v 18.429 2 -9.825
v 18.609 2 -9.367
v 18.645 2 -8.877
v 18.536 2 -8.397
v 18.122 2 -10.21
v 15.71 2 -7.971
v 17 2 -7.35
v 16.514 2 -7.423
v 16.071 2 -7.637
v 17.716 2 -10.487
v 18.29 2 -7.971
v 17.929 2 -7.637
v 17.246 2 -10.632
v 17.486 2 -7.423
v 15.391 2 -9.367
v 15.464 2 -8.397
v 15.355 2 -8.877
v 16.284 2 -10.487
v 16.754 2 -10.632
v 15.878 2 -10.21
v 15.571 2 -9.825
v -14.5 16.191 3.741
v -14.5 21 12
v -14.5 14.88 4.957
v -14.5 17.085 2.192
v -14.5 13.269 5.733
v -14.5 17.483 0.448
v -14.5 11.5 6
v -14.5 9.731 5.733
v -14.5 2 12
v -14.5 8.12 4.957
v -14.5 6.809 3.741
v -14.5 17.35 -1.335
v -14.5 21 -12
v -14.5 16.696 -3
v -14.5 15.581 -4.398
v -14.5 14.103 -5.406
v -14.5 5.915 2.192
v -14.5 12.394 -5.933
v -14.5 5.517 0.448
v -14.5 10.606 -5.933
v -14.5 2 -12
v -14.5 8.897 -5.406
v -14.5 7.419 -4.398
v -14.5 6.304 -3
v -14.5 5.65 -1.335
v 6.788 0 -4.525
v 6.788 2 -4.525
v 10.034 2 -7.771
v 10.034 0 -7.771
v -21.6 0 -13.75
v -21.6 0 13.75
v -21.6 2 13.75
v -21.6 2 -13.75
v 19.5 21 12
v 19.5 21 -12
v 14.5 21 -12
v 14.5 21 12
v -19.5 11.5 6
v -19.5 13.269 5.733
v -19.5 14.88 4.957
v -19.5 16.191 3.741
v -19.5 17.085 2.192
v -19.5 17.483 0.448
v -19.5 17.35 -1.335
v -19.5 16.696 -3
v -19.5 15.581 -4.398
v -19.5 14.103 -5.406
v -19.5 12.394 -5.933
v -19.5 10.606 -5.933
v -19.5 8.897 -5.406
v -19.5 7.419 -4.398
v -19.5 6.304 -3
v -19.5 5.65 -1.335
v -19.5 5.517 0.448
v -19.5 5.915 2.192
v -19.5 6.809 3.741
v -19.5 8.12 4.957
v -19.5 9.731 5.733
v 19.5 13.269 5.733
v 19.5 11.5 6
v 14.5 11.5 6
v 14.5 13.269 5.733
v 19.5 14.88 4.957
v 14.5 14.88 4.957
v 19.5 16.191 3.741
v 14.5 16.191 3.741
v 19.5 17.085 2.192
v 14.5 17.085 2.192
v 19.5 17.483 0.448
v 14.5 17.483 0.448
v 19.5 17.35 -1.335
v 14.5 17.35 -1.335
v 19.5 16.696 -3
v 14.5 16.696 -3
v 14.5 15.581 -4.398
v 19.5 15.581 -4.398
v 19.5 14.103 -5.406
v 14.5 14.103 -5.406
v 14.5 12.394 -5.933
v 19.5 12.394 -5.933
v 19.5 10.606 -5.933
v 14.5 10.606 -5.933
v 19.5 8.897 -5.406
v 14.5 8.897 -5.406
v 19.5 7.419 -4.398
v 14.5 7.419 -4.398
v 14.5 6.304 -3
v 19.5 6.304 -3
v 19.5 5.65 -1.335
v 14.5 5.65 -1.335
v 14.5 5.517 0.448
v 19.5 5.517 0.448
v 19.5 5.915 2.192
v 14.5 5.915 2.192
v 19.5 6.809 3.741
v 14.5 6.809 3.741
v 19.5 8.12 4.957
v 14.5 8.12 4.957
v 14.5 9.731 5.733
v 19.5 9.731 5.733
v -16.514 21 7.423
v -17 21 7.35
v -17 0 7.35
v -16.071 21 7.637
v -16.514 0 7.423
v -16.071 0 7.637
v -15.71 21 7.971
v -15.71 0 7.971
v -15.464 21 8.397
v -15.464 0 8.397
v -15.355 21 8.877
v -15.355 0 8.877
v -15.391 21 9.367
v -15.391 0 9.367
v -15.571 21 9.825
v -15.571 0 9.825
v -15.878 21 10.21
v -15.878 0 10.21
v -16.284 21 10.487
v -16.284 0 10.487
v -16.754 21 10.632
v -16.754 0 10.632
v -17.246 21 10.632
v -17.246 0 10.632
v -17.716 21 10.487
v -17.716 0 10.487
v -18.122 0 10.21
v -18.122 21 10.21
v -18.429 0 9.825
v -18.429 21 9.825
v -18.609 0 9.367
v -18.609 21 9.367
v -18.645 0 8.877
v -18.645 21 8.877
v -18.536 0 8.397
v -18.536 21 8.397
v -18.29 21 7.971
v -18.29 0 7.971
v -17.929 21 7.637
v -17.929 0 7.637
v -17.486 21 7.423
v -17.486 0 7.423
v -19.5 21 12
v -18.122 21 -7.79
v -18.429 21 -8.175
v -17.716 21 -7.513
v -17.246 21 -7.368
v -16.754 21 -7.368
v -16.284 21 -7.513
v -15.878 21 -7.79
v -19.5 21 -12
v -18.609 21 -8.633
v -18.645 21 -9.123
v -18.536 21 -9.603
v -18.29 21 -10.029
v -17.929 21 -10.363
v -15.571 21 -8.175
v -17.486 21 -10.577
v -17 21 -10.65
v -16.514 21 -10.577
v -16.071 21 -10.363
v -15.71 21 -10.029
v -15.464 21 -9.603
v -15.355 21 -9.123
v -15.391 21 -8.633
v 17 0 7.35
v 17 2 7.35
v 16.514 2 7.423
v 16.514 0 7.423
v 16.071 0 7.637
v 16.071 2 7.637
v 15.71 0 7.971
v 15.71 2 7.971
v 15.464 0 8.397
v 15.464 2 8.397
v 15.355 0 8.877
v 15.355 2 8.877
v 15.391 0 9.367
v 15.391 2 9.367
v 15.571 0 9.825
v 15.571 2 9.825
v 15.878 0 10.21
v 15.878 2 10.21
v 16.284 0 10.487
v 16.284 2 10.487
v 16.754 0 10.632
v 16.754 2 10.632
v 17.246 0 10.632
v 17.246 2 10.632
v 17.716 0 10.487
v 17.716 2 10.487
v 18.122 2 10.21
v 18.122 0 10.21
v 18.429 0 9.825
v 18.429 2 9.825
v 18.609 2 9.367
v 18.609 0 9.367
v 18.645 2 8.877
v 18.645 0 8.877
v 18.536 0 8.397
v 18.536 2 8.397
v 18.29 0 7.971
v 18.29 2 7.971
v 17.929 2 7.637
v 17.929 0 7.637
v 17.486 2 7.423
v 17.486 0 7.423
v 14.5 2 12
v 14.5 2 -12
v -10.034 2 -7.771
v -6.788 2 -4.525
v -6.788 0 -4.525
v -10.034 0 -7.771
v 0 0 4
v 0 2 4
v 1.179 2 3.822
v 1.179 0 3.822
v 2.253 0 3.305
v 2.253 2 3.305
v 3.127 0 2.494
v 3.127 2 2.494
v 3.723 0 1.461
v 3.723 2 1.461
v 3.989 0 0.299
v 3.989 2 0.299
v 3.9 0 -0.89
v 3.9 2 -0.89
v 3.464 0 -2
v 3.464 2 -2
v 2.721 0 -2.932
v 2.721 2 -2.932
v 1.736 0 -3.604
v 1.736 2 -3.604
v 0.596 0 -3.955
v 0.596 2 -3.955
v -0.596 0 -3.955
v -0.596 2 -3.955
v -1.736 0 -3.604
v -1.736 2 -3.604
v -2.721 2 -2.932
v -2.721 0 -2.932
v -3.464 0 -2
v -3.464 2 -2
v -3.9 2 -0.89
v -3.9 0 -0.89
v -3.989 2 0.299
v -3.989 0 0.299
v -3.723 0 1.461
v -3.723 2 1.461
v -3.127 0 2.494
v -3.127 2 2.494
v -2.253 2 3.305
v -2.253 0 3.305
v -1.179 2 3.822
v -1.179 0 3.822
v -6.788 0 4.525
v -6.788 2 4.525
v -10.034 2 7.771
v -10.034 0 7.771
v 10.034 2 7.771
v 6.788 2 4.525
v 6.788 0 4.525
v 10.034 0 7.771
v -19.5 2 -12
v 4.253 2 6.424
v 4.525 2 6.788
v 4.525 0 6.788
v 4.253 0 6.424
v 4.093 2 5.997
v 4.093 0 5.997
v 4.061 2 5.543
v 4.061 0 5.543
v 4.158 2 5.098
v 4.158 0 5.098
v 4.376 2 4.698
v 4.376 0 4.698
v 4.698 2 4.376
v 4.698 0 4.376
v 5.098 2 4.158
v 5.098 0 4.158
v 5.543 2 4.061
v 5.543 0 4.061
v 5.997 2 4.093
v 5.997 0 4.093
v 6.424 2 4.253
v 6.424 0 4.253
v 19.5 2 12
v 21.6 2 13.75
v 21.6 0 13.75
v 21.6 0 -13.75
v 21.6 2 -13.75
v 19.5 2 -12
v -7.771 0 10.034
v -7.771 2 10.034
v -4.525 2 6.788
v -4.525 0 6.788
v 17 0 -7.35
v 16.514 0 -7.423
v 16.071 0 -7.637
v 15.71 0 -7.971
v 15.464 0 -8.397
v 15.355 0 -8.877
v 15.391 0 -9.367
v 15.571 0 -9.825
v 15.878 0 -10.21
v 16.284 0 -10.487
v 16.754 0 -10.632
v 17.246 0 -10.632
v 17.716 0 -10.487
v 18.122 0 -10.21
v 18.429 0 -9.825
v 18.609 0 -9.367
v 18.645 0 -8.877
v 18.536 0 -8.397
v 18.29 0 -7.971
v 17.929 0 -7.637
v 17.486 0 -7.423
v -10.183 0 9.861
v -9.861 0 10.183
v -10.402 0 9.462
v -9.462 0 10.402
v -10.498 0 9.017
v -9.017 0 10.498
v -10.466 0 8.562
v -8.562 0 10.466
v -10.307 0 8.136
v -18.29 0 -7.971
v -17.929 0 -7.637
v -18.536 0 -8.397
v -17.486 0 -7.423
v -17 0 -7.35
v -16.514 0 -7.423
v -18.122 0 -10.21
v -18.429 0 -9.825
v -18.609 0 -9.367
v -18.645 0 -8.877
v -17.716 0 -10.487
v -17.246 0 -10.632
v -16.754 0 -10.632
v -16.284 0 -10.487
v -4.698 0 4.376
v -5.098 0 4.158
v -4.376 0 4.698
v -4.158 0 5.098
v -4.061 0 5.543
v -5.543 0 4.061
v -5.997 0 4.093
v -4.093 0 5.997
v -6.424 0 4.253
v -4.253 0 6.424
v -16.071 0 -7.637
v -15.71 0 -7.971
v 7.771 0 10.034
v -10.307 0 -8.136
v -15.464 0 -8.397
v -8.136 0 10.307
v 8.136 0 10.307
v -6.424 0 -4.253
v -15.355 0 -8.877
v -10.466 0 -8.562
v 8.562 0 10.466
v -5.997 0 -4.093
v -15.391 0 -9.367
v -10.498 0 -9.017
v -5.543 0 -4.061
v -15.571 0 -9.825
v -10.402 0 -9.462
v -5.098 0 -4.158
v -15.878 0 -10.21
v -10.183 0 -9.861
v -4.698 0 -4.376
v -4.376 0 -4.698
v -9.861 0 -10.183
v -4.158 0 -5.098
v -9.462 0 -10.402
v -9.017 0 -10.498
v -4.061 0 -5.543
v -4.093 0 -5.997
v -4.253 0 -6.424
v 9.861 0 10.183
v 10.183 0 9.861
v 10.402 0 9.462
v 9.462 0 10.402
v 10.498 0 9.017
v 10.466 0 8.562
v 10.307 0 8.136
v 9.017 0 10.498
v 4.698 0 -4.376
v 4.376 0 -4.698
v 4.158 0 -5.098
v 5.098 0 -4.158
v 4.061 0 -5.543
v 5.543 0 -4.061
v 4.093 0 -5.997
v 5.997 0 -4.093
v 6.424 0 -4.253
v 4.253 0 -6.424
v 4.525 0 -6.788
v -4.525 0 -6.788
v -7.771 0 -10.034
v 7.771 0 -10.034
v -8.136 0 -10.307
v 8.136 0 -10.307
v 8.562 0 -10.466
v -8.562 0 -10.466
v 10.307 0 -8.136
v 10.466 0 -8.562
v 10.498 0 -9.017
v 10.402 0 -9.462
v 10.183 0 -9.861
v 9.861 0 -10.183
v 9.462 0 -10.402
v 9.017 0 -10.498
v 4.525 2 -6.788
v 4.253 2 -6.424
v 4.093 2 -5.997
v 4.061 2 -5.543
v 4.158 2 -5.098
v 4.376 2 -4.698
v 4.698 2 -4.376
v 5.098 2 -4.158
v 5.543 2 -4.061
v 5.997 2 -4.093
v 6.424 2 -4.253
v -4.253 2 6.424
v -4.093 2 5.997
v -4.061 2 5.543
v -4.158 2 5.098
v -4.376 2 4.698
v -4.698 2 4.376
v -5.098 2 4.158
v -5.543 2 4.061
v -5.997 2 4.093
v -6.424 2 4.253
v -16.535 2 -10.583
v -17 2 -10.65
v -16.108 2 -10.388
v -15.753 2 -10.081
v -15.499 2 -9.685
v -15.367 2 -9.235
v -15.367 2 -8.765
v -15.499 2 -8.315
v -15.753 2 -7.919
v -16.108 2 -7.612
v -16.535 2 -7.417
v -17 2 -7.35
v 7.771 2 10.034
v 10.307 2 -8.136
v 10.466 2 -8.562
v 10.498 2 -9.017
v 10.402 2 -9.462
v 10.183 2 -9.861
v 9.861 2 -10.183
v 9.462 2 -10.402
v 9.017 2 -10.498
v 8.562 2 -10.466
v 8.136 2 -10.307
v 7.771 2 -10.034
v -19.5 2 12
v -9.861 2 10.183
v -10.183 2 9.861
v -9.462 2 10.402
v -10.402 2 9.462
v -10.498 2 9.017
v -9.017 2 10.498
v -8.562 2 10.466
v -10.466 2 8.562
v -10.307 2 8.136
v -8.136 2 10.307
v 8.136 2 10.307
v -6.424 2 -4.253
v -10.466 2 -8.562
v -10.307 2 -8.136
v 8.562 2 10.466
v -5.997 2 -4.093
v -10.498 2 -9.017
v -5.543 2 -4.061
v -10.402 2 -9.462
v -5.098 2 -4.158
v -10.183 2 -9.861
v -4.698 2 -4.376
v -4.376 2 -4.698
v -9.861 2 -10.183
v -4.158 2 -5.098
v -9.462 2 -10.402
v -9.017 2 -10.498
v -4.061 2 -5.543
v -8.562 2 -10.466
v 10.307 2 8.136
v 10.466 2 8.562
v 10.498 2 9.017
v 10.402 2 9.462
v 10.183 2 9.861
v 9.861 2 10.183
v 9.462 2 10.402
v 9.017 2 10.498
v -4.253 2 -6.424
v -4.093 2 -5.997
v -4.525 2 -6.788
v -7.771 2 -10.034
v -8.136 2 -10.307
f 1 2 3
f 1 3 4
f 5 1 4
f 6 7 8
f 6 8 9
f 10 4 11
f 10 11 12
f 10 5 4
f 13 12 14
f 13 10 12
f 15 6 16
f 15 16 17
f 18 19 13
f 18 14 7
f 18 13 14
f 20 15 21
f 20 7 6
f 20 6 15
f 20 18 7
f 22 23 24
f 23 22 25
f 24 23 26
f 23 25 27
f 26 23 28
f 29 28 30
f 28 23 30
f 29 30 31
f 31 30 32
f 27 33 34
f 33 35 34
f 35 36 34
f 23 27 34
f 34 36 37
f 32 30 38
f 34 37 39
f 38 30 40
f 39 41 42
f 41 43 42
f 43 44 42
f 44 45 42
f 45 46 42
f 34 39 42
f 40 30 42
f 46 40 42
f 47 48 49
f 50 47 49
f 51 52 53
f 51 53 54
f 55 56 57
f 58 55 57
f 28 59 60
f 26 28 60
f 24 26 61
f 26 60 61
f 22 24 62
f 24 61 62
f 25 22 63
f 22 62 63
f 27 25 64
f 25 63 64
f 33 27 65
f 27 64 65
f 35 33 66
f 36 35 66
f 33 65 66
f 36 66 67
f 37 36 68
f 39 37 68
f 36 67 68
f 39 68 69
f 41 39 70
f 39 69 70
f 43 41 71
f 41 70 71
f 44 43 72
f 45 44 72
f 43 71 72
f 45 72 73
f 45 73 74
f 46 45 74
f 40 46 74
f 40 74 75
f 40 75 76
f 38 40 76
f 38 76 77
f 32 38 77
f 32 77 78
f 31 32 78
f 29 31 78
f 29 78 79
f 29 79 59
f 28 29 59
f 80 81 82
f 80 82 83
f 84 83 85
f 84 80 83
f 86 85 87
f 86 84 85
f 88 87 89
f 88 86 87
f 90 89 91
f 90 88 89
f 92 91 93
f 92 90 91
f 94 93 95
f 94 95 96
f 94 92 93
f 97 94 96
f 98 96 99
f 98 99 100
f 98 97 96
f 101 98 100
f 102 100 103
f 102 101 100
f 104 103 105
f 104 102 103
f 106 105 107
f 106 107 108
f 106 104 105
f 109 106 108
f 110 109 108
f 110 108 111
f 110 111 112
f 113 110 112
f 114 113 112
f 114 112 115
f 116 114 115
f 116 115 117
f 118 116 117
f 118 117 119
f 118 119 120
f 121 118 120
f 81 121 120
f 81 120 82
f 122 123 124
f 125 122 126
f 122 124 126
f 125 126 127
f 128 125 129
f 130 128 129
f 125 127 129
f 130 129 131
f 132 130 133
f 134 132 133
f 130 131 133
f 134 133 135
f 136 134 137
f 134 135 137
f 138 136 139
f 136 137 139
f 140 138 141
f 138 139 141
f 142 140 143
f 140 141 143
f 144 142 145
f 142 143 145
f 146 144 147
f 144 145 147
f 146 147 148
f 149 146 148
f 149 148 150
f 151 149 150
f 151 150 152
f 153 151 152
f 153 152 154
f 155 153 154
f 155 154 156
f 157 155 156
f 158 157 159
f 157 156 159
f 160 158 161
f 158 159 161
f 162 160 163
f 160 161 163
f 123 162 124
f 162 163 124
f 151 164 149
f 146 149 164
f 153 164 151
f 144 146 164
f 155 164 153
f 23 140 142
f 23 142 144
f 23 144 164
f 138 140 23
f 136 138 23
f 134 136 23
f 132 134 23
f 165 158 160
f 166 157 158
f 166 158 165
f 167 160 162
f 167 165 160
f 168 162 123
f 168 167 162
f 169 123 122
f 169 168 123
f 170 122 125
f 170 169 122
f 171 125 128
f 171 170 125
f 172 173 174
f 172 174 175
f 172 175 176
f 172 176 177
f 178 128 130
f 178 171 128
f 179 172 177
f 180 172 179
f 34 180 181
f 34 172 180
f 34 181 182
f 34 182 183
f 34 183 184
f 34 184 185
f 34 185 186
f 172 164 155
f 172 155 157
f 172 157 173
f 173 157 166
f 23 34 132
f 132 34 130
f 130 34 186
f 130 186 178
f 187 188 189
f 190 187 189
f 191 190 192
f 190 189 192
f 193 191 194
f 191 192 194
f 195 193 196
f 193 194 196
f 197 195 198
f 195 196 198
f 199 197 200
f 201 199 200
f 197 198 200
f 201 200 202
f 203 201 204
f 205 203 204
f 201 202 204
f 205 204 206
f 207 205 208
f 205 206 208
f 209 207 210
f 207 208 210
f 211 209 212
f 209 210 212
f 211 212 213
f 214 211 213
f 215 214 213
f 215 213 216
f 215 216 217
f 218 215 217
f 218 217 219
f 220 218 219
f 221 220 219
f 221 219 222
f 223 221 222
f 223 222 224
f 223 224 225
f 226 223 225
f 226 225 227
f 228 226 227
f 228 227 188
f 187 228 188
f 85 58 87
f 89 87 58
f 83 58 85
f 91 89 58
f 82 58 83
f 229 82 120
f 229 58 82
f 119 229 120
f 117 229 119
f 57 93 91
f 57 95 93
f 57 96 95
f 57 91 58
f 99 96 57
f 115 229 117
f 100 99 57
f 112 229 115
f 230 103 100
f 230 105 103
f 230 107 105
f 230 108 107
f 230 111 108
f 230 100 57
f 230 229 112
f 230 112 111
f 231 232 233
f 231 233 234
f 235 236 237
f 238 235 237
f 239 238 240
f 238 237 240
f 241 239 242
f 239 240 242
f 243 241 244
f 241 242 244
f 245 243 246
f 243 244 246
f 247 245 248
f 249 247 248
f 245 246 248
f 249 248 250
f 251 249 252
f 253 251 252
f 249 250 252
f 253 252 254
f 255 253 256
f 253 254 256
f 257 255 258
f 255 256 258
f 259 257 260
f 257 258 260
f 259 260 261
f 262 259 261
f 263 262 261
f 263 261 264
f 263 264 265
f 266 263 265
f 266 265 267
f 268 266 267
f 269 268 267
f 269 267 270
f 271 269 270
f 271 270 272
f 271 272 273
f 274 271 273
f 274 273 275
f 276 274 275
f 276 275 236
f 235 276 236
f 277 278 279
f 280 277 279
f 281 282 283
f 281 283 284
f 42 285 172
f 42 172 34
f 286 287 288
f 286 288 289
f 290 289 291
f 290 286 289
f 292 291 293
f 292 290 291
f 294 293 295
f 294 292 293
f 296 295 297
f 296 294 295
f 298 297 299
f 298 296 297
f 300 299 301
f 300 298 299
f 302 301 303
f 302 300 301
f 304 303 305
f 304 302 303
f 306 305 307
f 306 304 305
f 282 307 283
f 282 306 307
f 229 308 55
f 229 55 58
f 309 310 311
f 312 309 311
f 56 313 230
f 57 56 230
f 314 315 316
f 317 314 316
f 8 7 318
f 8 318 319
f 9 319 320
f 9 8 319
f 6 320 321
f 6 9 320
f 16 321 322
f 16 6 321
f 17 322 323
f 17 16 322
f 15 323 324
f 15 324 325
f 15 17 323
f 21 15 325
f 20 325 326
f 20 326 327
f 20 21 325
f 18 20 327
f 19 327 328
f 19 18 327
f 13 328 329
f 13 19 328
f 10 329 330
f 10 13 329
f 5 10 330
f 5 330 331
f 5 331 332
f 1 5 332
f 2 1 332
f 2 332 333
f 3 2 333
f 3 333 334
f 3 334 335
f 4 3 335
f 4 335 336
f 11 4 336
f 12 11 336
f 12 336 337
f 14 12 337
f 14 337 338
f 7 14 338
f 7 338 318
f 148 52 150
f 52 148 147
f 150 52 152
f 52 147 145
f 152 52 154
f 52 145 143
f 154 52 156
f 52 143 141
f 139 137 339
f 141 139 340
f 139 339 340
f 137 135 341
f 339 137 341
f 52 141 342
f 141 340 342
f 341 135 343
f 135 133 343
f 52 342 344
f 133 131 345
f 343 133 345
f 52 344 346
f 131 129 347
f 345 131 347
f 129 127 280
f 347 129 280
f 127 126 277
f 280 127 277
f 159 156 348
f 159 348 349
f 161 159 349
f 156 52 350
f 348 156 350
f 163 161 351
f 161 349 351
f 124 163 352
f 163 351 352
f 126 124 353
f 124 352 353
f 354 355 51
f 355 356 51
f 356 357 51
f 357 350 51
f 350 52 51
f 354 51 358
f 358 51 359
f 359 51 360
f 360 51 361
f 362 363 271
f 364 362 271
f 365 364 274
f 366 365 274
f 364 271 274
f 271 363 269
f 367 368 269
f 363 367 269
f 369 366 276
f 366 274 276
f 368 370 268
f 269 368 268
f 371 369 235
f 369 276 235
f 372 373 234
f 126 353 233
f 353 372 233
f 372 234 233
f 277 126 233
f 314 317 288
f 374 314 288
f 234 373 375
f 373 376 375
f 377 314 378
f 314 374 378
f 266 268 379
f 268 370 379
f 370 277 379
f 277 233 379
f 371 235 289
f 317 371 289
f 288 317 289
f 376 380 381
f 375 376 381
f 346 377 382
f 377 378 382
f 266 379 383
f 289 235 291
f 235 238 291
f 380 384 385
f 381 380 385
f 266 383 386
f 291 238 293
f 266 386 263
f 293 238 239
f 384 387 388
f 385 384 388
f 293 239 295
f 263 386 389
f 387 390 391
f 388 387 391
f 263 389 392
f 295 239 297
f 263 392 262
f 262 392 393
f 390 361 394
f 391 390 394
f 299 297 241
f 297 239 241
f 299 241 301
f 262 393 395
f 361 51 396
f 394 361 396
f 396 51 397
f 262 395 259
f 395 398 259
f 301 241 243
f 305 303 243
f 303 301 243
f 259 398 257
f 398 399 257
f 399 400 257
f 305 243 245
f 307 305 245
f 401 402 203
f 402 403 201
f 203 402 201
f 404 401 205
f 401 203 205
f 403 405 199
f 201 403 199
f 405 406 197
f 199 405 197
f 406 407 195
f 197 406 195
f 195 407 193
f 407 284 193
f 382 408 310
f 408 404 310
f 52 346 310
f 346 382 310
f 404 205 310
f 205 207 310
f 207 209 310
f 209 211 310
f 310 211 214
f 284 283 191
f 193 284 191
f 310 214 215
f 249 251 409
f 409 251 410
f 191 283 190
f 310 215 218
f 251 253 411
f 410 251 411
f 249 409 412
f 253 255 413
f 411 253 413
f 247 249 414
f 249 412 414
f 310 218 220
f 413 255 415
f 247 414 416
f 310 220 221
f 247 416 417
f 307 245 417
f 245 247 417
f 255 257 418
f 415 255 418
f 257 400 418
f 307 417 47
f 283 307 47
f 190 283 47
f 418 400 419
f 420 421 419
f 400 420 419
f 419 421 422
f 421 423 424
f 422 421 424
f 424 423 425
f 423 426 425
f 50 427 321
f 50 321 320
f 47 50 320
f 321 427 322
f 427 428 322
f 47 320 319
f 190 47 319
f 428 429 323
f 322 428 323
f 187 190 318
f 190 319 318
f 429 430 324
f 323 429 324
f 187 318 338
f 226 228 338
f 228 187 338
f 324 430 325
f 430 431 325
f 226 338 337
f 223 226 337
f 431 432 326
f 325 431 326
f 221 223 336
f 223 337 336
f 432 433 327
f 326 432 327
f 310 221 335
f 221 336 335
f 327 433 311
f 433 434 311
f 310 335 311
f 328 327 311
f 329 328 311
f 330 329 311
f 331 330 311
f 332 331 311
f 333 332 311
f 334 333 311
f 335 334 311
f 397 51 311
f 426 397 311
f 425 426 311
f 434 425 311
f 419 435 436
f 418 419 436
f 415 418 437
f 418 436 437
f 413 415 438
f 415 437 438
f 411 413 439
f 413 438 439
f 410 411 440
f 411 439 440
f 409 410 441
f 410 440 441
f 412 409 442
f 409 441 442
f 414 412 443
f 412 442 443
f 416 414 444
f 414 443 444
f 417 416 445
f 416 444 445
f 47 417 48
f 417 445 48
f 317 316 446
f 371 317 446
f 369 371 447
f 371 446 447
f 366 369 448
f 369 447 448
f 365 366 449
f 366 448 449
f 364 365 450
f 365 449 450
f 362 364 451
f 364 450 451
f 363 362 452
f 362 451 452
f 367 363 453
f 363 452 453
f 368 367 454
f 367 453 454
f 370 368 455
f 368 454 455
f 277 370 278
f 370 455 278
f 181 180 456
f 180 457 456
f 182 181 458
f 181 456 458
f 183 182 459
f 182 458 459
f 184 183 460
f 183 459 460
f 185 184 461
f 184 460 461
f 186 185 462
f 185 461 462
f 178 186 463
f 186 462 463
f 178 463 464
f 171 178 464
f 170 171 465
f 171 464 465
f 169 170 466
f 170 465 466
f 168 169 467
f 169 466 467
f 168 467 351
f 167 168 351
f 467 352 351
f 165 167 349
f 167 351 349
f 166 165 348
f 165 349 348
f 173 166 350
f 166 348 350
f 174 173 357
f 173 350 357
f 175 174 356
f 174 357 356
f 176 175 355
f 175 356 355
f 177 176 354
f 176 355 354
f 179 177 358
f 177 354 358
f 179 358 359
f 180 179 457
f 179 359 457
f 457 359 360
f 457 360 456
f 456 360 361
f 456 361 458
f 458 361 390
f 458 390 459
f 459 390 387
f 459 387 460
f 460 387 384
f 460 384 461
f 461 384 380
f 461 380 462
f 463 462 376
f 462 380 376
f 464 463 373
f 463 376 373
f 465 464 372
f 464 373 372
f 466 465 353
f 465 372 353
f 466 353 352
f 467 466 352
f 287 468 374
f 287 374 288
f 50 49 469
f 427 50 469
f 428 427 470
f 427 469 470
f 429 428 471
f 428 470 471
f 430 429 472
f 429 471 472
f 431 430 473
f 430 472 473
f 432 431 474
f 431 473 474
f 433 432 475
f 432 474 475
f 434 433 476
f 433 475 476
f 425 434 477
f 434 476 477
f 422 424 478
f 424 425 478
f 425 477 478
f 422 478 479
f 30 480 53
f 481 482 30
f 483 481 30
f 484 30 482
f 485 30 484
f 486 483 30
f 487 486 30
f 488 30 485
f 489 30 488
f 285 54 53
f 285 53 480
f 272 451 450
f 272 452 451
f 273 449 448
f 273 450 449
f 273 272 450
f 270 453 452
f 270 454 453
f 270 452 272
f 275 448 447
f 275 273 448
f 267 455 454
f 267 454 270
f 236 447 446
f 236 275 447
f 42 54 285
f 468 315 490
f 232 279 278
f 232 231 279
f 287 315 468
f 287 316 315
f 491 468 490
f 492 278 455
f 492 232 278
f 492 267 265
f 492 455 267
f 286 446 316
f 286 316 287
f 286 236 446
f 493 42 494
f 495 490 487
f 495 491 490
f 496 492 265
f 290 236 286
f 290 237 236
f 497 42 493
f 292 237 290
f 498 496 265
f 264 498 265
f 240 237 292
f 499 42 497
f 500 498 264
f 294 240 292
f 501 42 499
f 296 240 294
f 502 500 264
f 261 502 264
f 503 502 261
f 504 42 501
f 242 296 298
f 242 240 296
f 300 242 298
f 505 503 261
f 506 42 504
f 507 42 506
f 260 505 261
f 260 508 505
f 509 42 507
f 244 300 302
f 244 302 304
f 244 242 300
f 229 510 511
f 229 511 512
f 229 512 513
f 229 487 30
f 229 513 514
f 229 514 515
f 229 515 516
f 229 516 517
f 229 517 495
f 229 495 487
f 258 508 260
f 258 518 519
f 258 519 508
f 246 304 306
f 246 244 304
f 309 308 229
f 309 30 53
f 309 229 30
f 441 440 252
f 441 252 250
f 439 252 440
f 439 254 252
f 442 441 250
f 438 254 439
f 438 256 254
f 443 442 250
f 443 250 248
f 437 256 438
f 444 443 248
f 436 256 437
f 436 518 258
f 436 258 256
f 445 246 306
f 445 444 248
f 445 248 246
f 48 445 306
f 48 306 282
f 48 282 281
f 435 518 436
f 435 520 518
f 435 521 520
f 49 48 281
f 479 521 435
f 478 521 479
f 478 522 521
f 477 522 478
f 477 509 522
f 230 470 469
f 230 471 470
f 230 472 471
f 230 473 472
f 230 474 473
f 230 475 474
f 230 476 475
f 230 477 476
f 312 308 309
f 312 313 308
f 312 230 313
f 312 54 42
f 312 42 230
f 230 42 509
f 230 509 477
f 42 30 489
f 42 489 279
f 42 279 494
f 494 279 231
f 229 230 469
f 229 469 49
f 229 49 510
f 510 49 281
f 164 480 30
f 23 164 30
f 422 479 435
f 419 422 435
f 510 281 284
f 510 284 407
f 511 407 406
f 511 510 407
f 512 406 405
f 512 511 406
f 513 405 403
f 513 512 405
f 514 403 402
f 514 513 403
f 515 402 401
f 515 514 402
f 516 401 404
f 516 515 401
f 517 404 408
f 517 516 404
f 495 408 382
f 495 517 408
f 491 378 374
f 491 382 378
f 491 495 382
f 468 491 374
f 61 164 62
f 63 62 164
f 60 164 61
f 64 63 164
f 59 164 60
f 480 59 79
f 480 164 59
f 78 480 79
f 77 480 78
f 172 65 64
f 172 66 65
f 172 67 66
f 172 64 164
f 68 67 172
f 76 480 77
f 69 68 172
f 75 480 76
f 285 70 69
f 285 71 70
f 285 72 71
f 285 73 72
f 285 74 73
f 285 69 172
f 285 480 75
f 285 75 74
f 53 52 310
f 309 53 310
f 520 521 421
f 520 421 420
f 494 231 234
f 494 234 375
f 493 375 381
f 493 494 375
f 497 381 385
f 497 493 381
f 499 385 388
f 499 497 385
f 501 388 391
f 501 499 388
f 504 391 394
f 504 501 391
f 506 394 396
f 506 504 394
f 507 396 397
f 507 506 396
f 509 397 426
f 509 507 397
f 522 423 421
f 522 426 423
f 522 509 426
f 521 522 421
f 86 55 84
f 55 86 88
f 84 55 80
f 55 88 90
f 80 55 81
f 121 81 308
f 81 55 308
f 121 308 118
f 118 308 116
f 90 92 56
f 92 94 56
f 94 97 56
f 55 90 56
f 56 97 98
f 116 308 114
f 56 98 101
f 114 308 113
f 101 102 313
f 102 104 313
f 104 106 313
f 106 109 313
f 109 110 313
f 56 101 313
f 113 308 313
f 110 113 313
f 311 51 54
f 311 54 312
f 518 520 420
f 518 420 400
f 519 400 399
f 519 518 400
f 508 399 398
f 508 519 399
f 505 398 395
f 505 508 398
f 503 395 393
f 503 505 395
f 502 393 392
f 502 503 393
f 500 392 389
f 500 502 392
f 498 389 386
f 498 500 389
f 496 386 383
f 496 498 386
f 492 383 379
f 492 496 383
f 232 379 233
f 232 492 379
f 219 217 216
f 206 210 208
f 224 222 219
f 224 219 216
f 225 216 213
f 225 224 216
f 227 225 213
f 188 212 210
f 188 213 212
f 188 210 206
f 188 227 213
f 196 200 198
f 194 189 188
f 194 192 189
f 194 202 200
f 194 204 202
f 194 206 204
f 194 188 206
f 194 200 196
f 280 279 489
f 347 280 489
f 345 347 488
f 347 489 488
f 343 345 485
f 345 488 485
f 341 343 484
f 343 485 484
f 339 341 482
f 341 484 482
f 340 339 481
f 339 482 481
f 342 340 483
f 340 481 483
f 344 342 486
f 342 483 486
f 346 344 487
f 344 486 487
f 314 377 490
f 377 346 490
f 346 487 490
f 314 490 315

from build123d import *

# Parameters (mm, degrees)
SKETCH_1_W               = 43.2
SKETCH_1_H               = 27.5
EXTRUDE_1_DEPTH          = 2
CUT_EXTRUDE_1_REACH      = 27.683
SKETCH_2_R               = 1.65
CUT_EXTRUDE_2_REACH      = 27.683
MIRROR_2_COPY_1_REACH    = 27.683
MIRROR_2_COPY_1_SKETCH_R = 1.65
MIRROR_2_COPY_2_REACH    = 27.683
CUT_EXTRUDE_3_REACH      = 27.683
SKETCH_4_R               = 4
SKETCH_5_W               = 5
SKETCH_5_H               = 24
EXTRUDE_2_DEPTH          = 19
CUT_EXTRUDE_5_REACH      = 50.159
SKETCH_6_R               = 6
CUT_EXTRUDE_6_REACH      = 35.115
SKETCH_7_R               = 1.65


with BuildPart() as part:
    # 草图1 → 凸台-拉伸1 (new body)
    with BuildSketch(Plane(origin=(0, 0, 0), x_dir=(1, 0, 0), z_dir=(0, 1, 0))):
        Rectangle(SKETCH_1_W, SKETCH_1_H)
    extrude(amount=EXTRUDE_1_DEPTH)

    # 草图2 → 切除-拉伸1 (cut, up to next)
    with BuildSketch(Plane(origin=(0, 2, 0), x_dir=(1, 0, 0), z_dir=(0, 1, 0)), mode=Mode.PRIVATE) as cut_extrude_1_sk1:
        with Locations(Location((-17, 9, 0), (0, 0, 270))):
            Circle(SKETCH_2_R)
    cut_extrude_1_tool1 = extrude(cut_extrude_1_sk1.sketch, amount=-CUT_EXTRUDE_1_REACH, mode=Mode.PRIVATE) & part.part
    cut_extrude_1 = cut_extrude_1_tool1.solids().sort_by_distance((-17, 2, -9))[0]
    add(cut_extrude_1, mode=Mode.SUBTRACT)

    # 草图3 → 切除-拉伸2 (cut, up to next)
    with BuildSketch(Plane(origin=(0, 2, 0), x_dir=(1, 0, 0), z_dir=(0, 1, 0)), mode=Mode.PRIVATE) as cut_extrude_2_sk1:
        with BuildLine():
            Line((-6.788225099, 4.5254834), (-10.033845225, 7.771103525))
            ThreePointArc((-10.033845225, 7.771103525), (-10.033845225, 10.033845225), (-7.771103525, 10.033845225))
            Line((-7.771103525, 10.033845225), (-4.5254834, 6.788225099))
            ThreePointArc((-4.5254834, 6.788225099), (-4.5254834, 4.5254834), (-6.788225099, 4.5254834))
        make_face()
    cut_extrude_2_tool1 = extrude(cut_extrude_2_sk1.sketch, amount=-CUT_EXTRUDE_2_REACH, mode=Mode.PRIVATE) & part.part
    cut_extrude_2 = cut_extrude_2_tool1.solids().sort_by_distance((-7.279664, 2, -7.279664))[0]
    add(cut_extrude_2, mode=Mode.SUBTRACT)

    # 镜向1: 切除-拉伸1, 切除-拉伸2 across plane
    add(cut_extrude_1.mirror(Plane.XY), mode=Mode.SUBTRACT)
    add(cut_extrude_2.mirror(Plane.XY), mode=Mode.SUBTRACT)

    # 镜向2: 切除-拉伸1, 切除-拉伸2 across plane
    add(cut_extrude_1.mirror(Plane(origin=(0, 0, 0), x_dir=(0, 0, 1), z_dir=(1, 0, 0))), mode=Mode.SUBTRACT)
    add(cut_extrude_2.mirror(Plane(origin=(0, 0, 0), x_dir=(0, 0, 1), z_dir=(1, 0, 0))), mode=Mode.SUBTRACT)

    # 镜向2 copy 1 sketch → 镜向2 copy 1 (cut, up to next)
    with BuildSketch(Plane(origin=(0, 2, 0), x_dir=(-1, 0, 0), z_dir=(0, 1, 0)), mode=Mode.PRIVATE) as mirror_2_copy_1_sk1:
        with Locations(Location((-17, 9, 0), (0, 0, 270))):
            Circle(MIRROR_2_COPY_1_SKETCH_R)
    mirror_2_copy_1_tool1 = extrude(mirror_2_copy_1_sk1.sketch, amount=-MIRROR_2_COPY_1_REACH, mode=Mode.PRIVATE) & part.part
    add(mirror_2_copy_1_tool1.solids().sort_by_distance((17, 2, 9))[0], mode=Mode.SUBTRACT)

    # 镜向2 copy 2 sketch → 镜向2 copy 2 (cut, up to next)
    with BuildSketch(Plane(origin=(0, 2, 0), x_dir=(-1, 0, 0), z_dir=(0, 1, 0)), mode=Mode.PRIVATE) as mirror_2_copy_2_sk1:
        with BuildLine():
            Line((-6.788225099, 4.5254834), (-10.033845225, 7.771103525))
            ThreePointArc((-10.033845225, 7.771103525), (-10.033845225, 10.033845225), (-7.771103525, 10.033845225))
            Line((-7.771103525, 10.033845225), (-4.5254834, 6.788225099))
            ThreePointArc((-4.5254834, 6.788225099), (-4.5254834, 4.5254834), (-6.788225099, 4.5254834))
        make_face()
    mirror_2_copy_2_tool1 = extrude(mirror_2_copy_2_sk1.sketch, amount=-MIRROR_2_COPY_2_REACH, mode=Mode.PRIVATE) & part.part
    add(mirror_2_copy_2_tool1.solids().sort_by_distance((7.279664, 2, 7.279664))[0], mode=Mode.SUBTRACT)

    # 草图4 → 切除-拉伸3 (cut, up to next)
    with BuildSketch(Plane(origin=(0, 2, 0), x_dir=(1, 0, 0), z_dir=(0, 1, 0)), mode=Mode.PRIVATE) as cut_extrude_3_sk1:
        with Locations(Location((0, 0, 0), (0, 0, 270))):
            Circle(SKETCH_4_R)
    cut_extrude_3_tool1 = extrude(cut_extrude_3_sk1.sketch, amount=-CUT_EXTRUDE_3_REACH, mode=Mode.PRIVATE) & part.part
    add(cut_extrude_3_tool1.solids().sort_by_distance((0, 2, 0))[0], mode=Mode.SUBTRACT)

    # 草图5 → 凸台-拉伸2 (add)
    with BuildSketch(Plane(origin=(0, 2, 0), x_dir=(1, 0, 0), z_dir=(0, 1, 0))):
        with Locations((-17, 0)):
            Rectangle(SKETCH_5_W, SKETCH_5_H)
    extrude_2 = extrude(amount=EXTRUDE_2_DEPTH)

    # 草图6 → 切除-拉伸5 (cut, up to next)
    with BuildSketch(Plane.ZY.offset(19.5), mode=Mode.PRIVATE) as cut_extrude_5_sk1:
        with Locations((0, 11.5)):
            Circle(SKETCH_6_R)
    cut_extrude_5_tool1 = extrude(cut_extrude_5_sk1.sketch, amount=-CUT_EXTRUDE_5_REACH, mode=Mode.PRIVATE) & part.part
    cut_extrude_5 = cut_extrude_5_tool1.solids().sort_by_distance((-19.5, 11.5, 0))[0]
    add(cut_extrude_5, mode=Mode.SUBTRACT)

    # 草图7 → 切除-拉伸6 (cut, up to next)
    with BuildSketch(Plane.XZ, mode=Mode.PRIVATE) as cut_extrude_6_sk1:
        with Locations(Location((-17, 9, 0), (0, 0, 270))):
            Circle(SKETCH_7_R)
    cut_extrude_6_tool1 = extrude(cut_extrude_6_sk1.sketch, amount=-CUT_EXTRUDE_6_REACH, mode=Mode.PRIVATE) & part.part
    # 草图7 → 切除-拉伸6 (cut, up to next)
    with BuildSketch(Plane.XZ, mode=Mode.PRIVATE) as cut_extrude_6_sk2:
        with Locations(Location((-17, -9, 0), (0, 0, 270))):
            Circle(SKETCH_7_R)
    cut_extrude_6_tool2 = extrude(cut_extrude_6_sk2.sketch, amount=-CUT_EXTRUDE_6_REACH, mode=Mode.PRIVATE) & part.part
    add(cut_extrude_6_tool1.solids().sort_by_distance((-17, 0, 9))[0], mode=Mode.SUBTRACT)
    add(cut_extrude_6_tool2.solids().sort_by_distance((-17, 0, -9))[0], mode=Mode.SUBTRACT)

    # 镜向3: 切除-拉伸1, 凸台-拉伸2, 切除-拉伸5 across plane
    add(cut_extrude_1.mirror(Plane(origin=(0, 0, 0), x_dir=(0, 0, 1), z_dir=(1, 0, 0))), mode=Mode.SUBTRACT)
    add(extrude_2.mirror(Plane(origin=(0, 0, 0), x_dir=(0, 0, 1), z_dir=(1, 0, 0))))
    add(cut_extrude_5.mirror(Plane(origin=(0, 0, 0), x_dir=(0, 0, 1), z_dir=(1, 0, 0))), mode=Mode.SUBTRACT)


solid = part.part
